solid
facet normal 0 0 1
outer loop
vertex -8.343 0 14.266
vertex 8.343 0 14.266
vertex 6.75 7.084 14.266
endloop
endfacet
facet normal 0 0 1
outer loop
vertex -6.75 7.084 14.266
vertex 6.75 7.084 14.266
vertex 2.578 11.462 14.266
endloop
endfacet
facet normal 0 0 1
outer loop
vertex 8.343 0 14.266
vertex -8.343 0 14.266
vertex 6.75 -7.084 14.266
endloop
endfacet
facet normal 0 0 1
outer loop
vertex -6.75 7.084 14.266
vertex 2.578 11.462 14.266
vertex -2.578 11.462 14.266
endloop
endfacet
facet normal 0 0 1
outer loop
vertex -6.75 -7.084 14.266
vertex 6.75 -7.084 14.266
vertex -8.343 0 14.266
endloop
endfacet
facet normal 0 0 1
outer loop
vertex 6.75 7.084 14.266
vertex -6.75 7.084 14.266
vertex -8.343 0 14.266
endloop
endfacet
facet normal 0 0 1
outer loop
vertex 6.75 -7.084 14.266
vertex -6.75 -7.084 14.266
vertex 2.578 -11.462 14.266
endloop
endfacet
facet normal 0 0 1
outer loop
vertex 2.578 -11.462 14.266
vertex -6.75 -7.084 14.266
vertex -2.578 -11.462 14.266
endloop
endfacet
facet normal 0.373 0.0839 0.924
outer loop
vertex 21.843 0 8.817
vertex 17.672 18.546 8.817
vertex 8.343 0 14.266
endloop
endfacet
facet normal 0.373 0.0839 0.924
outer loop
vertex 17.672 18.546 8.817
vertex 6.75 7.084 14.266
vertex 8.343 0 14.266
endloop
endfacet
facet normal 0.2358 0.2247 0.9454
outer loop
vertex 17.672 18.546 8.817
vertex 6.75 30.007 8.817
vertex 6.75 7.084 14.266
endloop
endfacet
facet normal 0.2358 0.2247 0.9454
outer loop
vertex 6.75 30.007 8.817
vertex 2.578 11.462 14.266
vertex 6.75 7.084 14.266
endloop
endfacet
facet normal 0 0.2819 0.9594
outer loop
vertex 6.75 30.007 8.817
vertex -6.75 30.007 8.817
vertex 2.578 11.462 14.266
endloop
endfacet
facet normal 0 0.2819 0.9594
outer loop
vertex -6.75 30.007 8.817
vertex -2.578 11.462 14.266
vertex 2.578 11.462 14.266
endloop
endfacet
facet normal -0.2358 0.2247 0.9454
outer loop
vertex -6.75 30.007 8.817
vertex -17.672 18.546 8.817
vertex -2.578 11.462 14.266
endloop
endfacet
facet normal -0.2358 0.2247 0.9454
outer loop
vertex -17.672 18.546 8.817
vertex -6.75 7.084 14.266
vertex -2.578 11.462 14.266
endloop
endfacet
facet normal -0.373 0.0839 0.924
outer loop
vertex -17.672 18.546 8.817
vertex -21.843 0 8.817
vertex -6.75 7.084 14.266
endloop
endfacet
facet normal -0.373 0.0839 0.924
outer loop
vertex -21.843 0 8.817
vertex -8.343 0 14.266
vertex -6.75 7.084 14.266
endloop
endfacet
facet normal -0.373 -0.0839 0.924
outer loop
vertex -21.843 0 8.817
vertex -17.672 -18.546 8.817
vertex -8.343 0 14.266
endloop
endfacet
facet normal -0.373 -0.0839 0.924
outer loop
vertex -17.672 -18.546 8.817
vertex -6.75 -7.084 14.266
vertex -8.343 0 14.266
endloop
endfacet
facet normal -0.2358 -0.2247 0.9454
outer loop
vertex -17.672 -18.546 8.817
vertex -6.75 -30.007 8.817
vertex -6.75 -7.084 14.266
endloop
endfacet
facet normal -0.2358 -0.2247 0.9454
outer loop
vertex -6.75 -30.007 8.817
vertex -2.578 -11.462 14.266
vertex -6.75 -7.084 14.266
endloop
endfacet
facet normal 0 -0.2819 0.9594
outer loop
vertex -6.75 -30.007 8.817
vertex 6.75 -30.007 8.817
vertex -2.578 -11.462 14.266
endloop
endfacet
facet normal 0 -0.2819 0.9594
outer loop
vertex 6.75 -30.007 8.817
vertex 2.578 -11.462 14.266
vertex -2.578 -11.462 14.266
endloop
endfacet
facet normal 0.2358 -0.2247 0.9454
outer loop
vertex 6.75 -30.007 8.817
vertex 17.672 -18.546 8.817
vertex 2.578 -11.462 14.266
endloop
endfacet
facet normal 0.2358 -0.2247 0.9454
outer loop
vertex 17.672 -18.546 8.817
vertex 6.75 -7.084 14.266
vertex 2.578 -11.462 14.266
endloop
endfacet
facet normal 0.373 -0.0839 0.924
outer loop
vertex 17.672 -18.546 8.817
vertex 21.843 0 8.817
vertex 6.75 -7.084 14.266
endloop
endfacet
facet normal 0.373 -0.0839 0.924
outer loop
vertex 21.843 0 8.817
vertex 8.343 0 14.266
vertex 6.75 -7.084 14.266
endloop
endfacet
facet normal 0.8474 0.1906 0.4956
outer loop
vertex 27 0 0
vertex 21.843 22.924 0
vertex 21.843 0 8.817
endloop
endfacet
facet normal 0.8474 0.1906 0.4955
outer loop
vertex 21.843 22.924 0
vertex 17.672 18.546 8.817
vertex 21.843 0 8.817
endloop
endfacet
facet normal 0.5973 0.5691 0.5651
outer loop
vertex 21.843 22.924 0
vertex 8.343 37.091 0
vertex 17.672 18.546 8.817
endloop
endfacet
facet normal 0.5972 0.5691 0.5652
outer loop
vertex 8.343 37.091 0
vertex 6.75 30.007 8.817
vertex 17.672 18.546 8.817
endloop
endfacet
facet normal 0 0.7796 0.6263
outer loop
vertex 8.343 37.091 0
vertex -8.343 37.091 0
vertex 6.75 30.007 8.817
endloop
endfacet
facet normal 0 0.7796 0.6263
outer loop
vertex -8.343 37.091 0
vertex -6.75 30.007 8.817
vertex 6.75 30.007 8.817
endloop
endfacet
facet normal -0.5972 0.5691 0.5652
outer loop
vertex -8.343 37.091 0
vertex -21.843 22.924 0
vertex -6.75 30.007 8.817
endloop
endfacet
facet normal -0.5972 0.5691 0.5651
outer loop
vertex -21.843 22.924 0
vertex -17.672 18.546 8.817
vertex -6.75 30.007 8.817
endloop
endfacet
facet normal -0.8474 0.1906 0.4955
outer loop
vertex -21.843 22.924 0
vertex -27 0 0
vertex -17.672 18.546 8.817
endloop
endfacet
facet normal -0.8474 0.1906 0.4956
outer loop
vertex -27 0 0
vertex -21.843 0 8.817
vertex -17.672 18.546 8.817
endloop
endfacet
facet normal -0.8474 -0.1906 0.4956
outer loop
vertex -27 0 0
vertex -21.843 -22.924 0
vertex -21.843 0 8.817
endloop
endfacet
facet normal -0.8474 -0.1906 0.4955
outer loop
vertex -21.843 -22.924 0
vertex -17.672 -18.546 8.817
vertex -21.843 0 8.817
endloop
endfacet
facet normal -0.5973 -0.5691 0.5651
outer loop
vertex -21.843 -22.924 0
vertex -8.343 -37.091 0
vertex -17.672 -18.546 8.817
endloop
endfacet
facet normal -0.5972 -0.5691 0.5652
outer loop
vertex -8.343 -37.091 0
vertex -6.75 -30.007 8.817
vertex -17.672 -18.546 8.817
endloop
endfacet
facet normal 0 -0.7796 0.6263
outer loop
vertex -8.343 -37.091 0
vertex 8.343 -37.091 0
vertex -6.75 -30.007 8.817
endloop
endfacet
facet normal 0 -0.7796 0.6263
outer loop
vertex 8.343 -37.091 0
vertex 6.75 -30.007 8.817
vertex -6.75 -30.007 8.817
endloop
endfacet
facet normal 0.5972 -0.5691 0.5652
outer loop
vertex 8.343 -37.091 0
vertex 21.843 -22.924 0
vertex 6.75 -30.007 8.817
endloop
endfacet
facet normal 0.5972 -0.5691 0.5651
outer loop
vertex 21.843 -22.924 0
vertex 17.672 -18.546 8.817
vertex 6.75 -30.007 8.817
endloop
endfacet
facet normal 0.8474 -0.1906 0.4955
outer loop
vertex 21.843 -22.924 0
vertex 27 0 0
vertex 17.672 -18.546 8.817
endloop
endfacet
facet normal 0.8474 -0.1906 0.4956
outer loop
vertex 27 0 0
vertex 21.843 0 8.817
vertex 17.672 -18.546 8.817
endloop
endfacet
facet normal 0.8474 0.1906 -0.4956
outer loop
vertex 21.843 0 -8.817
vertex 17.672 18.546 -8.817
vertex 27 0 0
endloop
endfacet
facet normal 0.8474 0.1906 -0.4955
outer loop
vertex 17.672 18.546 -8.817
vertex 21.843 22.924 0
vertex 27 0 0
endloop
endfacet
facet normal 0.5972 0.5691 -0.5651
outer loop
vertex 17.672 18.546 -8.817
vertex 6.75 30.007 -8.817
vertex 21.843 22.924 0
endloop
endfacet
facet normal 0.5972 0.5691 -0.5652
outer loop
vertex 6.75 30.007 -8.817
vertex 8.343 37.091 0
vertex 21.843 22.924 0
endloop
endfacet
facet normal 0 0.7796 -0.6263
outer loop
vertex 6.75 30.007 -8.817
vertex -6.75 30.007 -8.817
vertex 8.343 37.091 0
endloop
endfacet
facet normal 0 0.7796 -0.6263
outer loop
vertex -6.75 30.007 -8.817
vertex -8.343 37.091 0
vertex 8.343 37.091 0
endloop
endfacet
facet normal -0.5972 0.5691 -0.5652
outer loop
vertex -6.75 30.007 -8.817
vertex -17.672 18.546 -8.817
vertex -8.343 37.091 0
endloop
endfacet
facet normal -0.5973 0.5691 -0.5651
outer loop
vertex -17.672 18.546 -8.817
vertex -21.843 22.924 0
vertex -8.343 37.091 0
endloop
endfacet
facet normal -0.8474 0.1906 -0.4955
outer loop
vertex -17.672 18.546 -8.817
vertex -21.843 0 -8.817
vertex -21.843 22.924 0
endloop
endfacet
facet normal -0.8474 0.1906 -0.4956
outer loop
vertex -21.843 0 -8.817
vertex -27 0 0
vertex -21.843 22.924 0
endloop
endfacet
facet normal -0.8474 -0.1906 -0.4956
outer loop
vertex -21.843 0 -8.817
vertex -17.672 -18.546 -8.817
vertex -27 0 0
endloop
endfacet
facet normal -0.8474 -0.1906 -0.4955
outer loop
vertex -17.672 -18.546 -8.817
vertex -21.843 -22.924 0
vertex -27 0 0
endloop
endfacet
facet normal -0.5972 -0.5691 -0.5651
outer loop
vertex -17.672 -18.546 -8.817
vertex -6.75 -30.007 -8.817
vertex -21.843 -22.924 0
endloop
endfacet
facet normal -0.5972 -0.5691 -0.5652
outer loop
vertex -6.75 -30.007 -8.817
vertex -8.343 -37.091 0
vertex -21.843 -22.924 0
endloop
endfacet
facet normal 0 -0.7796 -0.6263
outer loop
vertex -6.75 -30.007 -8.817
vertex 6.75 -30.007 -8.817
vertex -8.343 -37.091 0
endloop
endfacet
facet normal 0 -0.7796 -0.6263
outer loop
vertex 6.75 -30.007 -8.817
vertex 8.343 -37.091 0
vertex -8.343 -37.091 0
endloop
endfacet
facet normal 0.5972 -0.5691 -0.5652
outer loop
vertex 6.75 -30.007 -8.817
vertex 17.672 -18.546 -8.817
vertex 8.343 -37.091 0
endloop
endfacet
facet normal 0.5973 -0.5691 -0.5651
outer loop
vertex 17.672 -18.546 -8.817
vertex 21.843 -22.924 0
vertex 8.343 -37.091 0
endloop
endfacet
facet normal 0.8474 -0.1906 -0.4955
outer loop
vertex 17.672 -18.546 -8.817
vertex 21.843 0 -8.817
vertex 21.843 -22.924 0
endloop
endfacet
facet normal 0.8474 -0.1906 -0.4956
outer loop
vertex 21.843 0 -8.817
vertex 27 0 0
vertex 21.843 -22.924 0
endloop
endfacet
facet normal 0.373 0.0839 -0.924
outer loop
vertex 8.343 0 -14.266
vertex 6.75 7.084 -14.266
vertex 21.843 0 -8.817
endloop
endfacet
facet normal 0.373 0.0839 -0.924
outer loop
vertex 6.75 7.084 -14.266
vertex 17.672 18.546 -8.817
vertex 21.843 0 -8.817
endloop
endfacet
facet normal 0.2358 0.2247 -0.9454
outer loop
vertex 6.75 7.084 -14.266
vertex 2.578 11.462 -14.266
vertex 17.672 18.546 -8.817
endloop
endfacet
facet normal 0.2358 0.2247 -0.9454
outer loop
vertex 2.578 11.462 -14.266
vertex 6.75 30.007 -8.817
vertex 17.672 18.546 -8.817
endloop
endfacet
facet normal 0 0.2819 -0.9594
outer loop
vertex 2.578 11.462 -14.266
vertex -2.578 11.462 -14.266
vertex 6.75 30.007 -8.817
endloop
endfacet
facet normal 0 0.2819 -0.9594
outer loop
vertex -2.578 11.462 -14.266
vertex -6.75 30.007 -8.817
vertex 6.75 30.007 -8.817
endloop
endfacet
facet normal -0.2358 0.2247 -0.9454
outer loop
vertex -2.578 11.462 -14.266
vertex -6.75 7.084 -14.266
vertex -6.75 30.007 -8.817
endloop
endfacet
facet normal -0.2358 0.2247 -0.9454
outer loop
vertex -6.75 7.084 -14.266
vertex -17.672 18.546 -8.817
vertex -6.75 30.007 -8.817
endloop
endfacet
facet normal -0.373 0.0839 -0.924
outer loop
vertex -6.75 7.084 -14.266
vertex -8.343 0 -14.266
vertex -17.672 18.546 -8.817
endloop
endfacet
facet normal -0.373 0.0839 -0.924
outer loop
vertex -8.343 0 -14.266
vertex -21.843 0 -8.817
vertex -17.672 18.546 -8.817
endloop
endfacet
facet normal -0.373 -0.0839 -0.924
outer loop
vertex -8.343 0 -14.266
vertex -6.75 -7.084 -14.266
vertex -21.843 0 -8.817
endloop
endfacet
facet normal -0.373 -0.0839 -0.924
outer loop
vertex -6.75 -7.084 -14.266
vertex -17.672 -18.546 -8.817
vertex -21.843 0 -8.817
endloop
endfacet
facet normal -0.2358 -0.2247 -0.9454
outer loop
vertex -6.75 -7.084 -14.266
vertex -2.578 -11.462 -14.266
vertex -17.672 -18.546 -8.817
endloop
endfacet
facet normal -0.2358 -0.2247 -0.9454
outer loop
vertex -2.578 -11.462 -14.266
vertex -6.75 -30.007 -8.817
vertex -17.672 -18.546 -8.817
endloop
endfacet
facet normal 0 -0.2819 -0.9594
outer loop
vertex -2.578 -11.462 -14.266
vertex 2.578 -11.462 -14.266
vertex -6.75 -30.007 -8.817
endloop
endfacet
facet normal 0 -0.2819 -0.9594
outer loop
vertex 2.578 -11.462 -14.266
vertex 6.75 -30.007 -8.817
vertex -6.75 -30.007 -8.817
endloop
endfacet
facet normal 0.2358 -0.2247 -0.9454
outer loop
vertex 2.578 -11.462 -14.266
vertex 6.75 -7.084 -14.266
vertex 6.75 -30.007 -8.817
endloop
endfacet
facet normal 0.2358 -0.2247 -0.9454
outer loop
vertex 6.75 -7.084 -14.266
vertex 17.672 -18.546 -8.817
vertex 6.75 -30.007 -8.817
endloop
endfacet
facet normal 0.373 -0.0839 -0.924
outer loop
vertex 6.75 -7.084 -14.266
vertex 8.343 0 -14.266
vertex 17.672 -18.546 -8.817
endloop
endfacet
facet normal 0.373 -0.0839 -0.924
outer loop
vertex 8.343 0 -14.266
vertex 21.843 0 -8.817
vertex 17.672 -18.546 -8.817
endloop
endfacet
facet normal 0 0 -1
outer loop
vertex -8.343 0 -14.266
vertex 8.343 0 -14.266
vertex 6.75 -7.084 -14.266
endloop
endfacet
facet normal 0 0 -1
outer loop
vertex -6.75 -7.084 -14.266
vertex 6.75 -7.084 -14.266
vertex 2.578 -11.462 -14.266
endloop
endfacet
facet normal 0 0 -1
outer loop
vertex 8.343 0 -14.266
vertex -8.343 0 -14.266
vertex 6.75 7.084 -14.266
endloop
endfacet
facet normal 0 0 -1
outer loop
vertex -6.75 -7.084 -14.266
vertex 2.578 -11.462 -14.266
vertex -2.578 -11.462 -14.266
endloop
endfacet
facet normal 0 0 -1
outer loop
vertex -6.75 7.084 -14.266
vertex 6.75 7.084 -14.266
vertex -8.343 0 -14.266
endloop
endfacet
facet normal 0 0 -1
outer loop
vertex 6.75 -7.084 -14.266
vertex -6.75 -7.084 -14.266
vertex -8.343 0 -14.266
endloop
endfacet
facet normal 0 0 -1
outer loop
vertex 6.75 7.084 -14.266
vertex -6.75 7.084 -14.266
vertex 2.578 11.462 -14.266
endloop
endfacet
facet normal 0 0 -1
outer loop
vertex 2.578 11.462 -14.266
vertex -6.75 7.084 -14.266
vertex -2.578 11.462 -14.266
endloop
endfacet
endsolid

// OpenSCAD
// Generated by SolidPython 1.0.1 on 2020-07-29 00:46:48


scale(v = [9, 13, 5]) {
	sphere(r = 3);
}
/***********************************************
*********      SolidPython code:      **********
************************************************
 
# import packages: SolidPython
from solid import *
from solid.utils import *
from itertools import chain, combinations, permutations


class Resize:

    def __init__(self, scad_file):
        self.scad_file = scad_file
        #self.scad_file = import_scad(scad_file)
        # cone/cylinder param:
        self.r1 = 0
        self.r2 = 0
        self.h = 0
        # rectangular prism param:
        self.w = 0
        self.l = 0
        # ellipse param:
        self.r = 0

    # import OpenScad code (file name corresponds to shape)


    # classify shape + parameters
    def assign(self, param1, param2, param3):
        if self.scad_file == 'cone.scad':
            self.r1 = param1
            self.r2 = param2
            self.h = param3
        elif self.scad_file == 'cylinder.scad':
            self.r1 = param1
            self.r2 = param2
            self.h = param3
        elif self.scad_file == 'rectangularPrism.scad':
            self.h = param1
            self.l = param2
            self.w = param3
        else:
            self.r = param1
            self.h = param2

    # resize parameters
    def iterate(self):
        x = range(3, 20, 2)
        i = 1
        if self.scad_file == 'cone.scad':
            tempList = list(permutations(x, 2))
            for temp in tempList:
                param1 = temp[0]
                param2 = temp[1]
                filepath = 'produced_scad_files/' + 'cone' + str(param1) + '_' + str(param2) + '_' + '.scad'
                scad_render_to_file(cylinder(h=param1, r1=param2, r2=0), filepath)

        elif self.scad_file == 'cylinder.scad':
            tempList = list(permutations(x, 3))
            for temp in tempList:
                param1 = temp[0]
                param2 = temp[1]
                filepath = 'produced_scad_files/' + 'cylinder' + str(param1) + '_' + str(param2) + '_' + '.scad'
                scad_render_to_file(cylinder(h=param1, r1=param2, r2=param2), filepath)

        elif self.scad_file == 'rectangularPrism.scad':
            tempList = list(permutations(x, 3))
            for temp in tempList:
                param1 = temp[0]
                param2 = temp[1]
                param3 = temp[2]
                filepath = 'produced_scad_files/' + 'rectangularPrism' + str(param1) + '_' + str(param2) + '_' + str(
                    param3) + '.scad'
                scad_render_to_file(cube(size=(param1, param2, param3)), filepath)

        elif self.scad_file == 'ellipse.scad':
            tempList = list(permutations(x, 4))
            for temp in tempList:
                param1 = temp[0]
                param2 = temp[1]
                param3 = temp[2]
                param4 = temp[3]
                filepath = 'produced_scad_files/' + 'ellipse' + str(param1) + '_' + str(param2) + '_' + str(param3) + '_' + str(param4) + '.scad'
                scad_render_to_file(scale([param1, param2, param3])(sphere(r=param4)), filepath)

    def render_to_scadfile(self):
        scad_render_to_file(scad, 'example.scad') 
 
************************************************/
